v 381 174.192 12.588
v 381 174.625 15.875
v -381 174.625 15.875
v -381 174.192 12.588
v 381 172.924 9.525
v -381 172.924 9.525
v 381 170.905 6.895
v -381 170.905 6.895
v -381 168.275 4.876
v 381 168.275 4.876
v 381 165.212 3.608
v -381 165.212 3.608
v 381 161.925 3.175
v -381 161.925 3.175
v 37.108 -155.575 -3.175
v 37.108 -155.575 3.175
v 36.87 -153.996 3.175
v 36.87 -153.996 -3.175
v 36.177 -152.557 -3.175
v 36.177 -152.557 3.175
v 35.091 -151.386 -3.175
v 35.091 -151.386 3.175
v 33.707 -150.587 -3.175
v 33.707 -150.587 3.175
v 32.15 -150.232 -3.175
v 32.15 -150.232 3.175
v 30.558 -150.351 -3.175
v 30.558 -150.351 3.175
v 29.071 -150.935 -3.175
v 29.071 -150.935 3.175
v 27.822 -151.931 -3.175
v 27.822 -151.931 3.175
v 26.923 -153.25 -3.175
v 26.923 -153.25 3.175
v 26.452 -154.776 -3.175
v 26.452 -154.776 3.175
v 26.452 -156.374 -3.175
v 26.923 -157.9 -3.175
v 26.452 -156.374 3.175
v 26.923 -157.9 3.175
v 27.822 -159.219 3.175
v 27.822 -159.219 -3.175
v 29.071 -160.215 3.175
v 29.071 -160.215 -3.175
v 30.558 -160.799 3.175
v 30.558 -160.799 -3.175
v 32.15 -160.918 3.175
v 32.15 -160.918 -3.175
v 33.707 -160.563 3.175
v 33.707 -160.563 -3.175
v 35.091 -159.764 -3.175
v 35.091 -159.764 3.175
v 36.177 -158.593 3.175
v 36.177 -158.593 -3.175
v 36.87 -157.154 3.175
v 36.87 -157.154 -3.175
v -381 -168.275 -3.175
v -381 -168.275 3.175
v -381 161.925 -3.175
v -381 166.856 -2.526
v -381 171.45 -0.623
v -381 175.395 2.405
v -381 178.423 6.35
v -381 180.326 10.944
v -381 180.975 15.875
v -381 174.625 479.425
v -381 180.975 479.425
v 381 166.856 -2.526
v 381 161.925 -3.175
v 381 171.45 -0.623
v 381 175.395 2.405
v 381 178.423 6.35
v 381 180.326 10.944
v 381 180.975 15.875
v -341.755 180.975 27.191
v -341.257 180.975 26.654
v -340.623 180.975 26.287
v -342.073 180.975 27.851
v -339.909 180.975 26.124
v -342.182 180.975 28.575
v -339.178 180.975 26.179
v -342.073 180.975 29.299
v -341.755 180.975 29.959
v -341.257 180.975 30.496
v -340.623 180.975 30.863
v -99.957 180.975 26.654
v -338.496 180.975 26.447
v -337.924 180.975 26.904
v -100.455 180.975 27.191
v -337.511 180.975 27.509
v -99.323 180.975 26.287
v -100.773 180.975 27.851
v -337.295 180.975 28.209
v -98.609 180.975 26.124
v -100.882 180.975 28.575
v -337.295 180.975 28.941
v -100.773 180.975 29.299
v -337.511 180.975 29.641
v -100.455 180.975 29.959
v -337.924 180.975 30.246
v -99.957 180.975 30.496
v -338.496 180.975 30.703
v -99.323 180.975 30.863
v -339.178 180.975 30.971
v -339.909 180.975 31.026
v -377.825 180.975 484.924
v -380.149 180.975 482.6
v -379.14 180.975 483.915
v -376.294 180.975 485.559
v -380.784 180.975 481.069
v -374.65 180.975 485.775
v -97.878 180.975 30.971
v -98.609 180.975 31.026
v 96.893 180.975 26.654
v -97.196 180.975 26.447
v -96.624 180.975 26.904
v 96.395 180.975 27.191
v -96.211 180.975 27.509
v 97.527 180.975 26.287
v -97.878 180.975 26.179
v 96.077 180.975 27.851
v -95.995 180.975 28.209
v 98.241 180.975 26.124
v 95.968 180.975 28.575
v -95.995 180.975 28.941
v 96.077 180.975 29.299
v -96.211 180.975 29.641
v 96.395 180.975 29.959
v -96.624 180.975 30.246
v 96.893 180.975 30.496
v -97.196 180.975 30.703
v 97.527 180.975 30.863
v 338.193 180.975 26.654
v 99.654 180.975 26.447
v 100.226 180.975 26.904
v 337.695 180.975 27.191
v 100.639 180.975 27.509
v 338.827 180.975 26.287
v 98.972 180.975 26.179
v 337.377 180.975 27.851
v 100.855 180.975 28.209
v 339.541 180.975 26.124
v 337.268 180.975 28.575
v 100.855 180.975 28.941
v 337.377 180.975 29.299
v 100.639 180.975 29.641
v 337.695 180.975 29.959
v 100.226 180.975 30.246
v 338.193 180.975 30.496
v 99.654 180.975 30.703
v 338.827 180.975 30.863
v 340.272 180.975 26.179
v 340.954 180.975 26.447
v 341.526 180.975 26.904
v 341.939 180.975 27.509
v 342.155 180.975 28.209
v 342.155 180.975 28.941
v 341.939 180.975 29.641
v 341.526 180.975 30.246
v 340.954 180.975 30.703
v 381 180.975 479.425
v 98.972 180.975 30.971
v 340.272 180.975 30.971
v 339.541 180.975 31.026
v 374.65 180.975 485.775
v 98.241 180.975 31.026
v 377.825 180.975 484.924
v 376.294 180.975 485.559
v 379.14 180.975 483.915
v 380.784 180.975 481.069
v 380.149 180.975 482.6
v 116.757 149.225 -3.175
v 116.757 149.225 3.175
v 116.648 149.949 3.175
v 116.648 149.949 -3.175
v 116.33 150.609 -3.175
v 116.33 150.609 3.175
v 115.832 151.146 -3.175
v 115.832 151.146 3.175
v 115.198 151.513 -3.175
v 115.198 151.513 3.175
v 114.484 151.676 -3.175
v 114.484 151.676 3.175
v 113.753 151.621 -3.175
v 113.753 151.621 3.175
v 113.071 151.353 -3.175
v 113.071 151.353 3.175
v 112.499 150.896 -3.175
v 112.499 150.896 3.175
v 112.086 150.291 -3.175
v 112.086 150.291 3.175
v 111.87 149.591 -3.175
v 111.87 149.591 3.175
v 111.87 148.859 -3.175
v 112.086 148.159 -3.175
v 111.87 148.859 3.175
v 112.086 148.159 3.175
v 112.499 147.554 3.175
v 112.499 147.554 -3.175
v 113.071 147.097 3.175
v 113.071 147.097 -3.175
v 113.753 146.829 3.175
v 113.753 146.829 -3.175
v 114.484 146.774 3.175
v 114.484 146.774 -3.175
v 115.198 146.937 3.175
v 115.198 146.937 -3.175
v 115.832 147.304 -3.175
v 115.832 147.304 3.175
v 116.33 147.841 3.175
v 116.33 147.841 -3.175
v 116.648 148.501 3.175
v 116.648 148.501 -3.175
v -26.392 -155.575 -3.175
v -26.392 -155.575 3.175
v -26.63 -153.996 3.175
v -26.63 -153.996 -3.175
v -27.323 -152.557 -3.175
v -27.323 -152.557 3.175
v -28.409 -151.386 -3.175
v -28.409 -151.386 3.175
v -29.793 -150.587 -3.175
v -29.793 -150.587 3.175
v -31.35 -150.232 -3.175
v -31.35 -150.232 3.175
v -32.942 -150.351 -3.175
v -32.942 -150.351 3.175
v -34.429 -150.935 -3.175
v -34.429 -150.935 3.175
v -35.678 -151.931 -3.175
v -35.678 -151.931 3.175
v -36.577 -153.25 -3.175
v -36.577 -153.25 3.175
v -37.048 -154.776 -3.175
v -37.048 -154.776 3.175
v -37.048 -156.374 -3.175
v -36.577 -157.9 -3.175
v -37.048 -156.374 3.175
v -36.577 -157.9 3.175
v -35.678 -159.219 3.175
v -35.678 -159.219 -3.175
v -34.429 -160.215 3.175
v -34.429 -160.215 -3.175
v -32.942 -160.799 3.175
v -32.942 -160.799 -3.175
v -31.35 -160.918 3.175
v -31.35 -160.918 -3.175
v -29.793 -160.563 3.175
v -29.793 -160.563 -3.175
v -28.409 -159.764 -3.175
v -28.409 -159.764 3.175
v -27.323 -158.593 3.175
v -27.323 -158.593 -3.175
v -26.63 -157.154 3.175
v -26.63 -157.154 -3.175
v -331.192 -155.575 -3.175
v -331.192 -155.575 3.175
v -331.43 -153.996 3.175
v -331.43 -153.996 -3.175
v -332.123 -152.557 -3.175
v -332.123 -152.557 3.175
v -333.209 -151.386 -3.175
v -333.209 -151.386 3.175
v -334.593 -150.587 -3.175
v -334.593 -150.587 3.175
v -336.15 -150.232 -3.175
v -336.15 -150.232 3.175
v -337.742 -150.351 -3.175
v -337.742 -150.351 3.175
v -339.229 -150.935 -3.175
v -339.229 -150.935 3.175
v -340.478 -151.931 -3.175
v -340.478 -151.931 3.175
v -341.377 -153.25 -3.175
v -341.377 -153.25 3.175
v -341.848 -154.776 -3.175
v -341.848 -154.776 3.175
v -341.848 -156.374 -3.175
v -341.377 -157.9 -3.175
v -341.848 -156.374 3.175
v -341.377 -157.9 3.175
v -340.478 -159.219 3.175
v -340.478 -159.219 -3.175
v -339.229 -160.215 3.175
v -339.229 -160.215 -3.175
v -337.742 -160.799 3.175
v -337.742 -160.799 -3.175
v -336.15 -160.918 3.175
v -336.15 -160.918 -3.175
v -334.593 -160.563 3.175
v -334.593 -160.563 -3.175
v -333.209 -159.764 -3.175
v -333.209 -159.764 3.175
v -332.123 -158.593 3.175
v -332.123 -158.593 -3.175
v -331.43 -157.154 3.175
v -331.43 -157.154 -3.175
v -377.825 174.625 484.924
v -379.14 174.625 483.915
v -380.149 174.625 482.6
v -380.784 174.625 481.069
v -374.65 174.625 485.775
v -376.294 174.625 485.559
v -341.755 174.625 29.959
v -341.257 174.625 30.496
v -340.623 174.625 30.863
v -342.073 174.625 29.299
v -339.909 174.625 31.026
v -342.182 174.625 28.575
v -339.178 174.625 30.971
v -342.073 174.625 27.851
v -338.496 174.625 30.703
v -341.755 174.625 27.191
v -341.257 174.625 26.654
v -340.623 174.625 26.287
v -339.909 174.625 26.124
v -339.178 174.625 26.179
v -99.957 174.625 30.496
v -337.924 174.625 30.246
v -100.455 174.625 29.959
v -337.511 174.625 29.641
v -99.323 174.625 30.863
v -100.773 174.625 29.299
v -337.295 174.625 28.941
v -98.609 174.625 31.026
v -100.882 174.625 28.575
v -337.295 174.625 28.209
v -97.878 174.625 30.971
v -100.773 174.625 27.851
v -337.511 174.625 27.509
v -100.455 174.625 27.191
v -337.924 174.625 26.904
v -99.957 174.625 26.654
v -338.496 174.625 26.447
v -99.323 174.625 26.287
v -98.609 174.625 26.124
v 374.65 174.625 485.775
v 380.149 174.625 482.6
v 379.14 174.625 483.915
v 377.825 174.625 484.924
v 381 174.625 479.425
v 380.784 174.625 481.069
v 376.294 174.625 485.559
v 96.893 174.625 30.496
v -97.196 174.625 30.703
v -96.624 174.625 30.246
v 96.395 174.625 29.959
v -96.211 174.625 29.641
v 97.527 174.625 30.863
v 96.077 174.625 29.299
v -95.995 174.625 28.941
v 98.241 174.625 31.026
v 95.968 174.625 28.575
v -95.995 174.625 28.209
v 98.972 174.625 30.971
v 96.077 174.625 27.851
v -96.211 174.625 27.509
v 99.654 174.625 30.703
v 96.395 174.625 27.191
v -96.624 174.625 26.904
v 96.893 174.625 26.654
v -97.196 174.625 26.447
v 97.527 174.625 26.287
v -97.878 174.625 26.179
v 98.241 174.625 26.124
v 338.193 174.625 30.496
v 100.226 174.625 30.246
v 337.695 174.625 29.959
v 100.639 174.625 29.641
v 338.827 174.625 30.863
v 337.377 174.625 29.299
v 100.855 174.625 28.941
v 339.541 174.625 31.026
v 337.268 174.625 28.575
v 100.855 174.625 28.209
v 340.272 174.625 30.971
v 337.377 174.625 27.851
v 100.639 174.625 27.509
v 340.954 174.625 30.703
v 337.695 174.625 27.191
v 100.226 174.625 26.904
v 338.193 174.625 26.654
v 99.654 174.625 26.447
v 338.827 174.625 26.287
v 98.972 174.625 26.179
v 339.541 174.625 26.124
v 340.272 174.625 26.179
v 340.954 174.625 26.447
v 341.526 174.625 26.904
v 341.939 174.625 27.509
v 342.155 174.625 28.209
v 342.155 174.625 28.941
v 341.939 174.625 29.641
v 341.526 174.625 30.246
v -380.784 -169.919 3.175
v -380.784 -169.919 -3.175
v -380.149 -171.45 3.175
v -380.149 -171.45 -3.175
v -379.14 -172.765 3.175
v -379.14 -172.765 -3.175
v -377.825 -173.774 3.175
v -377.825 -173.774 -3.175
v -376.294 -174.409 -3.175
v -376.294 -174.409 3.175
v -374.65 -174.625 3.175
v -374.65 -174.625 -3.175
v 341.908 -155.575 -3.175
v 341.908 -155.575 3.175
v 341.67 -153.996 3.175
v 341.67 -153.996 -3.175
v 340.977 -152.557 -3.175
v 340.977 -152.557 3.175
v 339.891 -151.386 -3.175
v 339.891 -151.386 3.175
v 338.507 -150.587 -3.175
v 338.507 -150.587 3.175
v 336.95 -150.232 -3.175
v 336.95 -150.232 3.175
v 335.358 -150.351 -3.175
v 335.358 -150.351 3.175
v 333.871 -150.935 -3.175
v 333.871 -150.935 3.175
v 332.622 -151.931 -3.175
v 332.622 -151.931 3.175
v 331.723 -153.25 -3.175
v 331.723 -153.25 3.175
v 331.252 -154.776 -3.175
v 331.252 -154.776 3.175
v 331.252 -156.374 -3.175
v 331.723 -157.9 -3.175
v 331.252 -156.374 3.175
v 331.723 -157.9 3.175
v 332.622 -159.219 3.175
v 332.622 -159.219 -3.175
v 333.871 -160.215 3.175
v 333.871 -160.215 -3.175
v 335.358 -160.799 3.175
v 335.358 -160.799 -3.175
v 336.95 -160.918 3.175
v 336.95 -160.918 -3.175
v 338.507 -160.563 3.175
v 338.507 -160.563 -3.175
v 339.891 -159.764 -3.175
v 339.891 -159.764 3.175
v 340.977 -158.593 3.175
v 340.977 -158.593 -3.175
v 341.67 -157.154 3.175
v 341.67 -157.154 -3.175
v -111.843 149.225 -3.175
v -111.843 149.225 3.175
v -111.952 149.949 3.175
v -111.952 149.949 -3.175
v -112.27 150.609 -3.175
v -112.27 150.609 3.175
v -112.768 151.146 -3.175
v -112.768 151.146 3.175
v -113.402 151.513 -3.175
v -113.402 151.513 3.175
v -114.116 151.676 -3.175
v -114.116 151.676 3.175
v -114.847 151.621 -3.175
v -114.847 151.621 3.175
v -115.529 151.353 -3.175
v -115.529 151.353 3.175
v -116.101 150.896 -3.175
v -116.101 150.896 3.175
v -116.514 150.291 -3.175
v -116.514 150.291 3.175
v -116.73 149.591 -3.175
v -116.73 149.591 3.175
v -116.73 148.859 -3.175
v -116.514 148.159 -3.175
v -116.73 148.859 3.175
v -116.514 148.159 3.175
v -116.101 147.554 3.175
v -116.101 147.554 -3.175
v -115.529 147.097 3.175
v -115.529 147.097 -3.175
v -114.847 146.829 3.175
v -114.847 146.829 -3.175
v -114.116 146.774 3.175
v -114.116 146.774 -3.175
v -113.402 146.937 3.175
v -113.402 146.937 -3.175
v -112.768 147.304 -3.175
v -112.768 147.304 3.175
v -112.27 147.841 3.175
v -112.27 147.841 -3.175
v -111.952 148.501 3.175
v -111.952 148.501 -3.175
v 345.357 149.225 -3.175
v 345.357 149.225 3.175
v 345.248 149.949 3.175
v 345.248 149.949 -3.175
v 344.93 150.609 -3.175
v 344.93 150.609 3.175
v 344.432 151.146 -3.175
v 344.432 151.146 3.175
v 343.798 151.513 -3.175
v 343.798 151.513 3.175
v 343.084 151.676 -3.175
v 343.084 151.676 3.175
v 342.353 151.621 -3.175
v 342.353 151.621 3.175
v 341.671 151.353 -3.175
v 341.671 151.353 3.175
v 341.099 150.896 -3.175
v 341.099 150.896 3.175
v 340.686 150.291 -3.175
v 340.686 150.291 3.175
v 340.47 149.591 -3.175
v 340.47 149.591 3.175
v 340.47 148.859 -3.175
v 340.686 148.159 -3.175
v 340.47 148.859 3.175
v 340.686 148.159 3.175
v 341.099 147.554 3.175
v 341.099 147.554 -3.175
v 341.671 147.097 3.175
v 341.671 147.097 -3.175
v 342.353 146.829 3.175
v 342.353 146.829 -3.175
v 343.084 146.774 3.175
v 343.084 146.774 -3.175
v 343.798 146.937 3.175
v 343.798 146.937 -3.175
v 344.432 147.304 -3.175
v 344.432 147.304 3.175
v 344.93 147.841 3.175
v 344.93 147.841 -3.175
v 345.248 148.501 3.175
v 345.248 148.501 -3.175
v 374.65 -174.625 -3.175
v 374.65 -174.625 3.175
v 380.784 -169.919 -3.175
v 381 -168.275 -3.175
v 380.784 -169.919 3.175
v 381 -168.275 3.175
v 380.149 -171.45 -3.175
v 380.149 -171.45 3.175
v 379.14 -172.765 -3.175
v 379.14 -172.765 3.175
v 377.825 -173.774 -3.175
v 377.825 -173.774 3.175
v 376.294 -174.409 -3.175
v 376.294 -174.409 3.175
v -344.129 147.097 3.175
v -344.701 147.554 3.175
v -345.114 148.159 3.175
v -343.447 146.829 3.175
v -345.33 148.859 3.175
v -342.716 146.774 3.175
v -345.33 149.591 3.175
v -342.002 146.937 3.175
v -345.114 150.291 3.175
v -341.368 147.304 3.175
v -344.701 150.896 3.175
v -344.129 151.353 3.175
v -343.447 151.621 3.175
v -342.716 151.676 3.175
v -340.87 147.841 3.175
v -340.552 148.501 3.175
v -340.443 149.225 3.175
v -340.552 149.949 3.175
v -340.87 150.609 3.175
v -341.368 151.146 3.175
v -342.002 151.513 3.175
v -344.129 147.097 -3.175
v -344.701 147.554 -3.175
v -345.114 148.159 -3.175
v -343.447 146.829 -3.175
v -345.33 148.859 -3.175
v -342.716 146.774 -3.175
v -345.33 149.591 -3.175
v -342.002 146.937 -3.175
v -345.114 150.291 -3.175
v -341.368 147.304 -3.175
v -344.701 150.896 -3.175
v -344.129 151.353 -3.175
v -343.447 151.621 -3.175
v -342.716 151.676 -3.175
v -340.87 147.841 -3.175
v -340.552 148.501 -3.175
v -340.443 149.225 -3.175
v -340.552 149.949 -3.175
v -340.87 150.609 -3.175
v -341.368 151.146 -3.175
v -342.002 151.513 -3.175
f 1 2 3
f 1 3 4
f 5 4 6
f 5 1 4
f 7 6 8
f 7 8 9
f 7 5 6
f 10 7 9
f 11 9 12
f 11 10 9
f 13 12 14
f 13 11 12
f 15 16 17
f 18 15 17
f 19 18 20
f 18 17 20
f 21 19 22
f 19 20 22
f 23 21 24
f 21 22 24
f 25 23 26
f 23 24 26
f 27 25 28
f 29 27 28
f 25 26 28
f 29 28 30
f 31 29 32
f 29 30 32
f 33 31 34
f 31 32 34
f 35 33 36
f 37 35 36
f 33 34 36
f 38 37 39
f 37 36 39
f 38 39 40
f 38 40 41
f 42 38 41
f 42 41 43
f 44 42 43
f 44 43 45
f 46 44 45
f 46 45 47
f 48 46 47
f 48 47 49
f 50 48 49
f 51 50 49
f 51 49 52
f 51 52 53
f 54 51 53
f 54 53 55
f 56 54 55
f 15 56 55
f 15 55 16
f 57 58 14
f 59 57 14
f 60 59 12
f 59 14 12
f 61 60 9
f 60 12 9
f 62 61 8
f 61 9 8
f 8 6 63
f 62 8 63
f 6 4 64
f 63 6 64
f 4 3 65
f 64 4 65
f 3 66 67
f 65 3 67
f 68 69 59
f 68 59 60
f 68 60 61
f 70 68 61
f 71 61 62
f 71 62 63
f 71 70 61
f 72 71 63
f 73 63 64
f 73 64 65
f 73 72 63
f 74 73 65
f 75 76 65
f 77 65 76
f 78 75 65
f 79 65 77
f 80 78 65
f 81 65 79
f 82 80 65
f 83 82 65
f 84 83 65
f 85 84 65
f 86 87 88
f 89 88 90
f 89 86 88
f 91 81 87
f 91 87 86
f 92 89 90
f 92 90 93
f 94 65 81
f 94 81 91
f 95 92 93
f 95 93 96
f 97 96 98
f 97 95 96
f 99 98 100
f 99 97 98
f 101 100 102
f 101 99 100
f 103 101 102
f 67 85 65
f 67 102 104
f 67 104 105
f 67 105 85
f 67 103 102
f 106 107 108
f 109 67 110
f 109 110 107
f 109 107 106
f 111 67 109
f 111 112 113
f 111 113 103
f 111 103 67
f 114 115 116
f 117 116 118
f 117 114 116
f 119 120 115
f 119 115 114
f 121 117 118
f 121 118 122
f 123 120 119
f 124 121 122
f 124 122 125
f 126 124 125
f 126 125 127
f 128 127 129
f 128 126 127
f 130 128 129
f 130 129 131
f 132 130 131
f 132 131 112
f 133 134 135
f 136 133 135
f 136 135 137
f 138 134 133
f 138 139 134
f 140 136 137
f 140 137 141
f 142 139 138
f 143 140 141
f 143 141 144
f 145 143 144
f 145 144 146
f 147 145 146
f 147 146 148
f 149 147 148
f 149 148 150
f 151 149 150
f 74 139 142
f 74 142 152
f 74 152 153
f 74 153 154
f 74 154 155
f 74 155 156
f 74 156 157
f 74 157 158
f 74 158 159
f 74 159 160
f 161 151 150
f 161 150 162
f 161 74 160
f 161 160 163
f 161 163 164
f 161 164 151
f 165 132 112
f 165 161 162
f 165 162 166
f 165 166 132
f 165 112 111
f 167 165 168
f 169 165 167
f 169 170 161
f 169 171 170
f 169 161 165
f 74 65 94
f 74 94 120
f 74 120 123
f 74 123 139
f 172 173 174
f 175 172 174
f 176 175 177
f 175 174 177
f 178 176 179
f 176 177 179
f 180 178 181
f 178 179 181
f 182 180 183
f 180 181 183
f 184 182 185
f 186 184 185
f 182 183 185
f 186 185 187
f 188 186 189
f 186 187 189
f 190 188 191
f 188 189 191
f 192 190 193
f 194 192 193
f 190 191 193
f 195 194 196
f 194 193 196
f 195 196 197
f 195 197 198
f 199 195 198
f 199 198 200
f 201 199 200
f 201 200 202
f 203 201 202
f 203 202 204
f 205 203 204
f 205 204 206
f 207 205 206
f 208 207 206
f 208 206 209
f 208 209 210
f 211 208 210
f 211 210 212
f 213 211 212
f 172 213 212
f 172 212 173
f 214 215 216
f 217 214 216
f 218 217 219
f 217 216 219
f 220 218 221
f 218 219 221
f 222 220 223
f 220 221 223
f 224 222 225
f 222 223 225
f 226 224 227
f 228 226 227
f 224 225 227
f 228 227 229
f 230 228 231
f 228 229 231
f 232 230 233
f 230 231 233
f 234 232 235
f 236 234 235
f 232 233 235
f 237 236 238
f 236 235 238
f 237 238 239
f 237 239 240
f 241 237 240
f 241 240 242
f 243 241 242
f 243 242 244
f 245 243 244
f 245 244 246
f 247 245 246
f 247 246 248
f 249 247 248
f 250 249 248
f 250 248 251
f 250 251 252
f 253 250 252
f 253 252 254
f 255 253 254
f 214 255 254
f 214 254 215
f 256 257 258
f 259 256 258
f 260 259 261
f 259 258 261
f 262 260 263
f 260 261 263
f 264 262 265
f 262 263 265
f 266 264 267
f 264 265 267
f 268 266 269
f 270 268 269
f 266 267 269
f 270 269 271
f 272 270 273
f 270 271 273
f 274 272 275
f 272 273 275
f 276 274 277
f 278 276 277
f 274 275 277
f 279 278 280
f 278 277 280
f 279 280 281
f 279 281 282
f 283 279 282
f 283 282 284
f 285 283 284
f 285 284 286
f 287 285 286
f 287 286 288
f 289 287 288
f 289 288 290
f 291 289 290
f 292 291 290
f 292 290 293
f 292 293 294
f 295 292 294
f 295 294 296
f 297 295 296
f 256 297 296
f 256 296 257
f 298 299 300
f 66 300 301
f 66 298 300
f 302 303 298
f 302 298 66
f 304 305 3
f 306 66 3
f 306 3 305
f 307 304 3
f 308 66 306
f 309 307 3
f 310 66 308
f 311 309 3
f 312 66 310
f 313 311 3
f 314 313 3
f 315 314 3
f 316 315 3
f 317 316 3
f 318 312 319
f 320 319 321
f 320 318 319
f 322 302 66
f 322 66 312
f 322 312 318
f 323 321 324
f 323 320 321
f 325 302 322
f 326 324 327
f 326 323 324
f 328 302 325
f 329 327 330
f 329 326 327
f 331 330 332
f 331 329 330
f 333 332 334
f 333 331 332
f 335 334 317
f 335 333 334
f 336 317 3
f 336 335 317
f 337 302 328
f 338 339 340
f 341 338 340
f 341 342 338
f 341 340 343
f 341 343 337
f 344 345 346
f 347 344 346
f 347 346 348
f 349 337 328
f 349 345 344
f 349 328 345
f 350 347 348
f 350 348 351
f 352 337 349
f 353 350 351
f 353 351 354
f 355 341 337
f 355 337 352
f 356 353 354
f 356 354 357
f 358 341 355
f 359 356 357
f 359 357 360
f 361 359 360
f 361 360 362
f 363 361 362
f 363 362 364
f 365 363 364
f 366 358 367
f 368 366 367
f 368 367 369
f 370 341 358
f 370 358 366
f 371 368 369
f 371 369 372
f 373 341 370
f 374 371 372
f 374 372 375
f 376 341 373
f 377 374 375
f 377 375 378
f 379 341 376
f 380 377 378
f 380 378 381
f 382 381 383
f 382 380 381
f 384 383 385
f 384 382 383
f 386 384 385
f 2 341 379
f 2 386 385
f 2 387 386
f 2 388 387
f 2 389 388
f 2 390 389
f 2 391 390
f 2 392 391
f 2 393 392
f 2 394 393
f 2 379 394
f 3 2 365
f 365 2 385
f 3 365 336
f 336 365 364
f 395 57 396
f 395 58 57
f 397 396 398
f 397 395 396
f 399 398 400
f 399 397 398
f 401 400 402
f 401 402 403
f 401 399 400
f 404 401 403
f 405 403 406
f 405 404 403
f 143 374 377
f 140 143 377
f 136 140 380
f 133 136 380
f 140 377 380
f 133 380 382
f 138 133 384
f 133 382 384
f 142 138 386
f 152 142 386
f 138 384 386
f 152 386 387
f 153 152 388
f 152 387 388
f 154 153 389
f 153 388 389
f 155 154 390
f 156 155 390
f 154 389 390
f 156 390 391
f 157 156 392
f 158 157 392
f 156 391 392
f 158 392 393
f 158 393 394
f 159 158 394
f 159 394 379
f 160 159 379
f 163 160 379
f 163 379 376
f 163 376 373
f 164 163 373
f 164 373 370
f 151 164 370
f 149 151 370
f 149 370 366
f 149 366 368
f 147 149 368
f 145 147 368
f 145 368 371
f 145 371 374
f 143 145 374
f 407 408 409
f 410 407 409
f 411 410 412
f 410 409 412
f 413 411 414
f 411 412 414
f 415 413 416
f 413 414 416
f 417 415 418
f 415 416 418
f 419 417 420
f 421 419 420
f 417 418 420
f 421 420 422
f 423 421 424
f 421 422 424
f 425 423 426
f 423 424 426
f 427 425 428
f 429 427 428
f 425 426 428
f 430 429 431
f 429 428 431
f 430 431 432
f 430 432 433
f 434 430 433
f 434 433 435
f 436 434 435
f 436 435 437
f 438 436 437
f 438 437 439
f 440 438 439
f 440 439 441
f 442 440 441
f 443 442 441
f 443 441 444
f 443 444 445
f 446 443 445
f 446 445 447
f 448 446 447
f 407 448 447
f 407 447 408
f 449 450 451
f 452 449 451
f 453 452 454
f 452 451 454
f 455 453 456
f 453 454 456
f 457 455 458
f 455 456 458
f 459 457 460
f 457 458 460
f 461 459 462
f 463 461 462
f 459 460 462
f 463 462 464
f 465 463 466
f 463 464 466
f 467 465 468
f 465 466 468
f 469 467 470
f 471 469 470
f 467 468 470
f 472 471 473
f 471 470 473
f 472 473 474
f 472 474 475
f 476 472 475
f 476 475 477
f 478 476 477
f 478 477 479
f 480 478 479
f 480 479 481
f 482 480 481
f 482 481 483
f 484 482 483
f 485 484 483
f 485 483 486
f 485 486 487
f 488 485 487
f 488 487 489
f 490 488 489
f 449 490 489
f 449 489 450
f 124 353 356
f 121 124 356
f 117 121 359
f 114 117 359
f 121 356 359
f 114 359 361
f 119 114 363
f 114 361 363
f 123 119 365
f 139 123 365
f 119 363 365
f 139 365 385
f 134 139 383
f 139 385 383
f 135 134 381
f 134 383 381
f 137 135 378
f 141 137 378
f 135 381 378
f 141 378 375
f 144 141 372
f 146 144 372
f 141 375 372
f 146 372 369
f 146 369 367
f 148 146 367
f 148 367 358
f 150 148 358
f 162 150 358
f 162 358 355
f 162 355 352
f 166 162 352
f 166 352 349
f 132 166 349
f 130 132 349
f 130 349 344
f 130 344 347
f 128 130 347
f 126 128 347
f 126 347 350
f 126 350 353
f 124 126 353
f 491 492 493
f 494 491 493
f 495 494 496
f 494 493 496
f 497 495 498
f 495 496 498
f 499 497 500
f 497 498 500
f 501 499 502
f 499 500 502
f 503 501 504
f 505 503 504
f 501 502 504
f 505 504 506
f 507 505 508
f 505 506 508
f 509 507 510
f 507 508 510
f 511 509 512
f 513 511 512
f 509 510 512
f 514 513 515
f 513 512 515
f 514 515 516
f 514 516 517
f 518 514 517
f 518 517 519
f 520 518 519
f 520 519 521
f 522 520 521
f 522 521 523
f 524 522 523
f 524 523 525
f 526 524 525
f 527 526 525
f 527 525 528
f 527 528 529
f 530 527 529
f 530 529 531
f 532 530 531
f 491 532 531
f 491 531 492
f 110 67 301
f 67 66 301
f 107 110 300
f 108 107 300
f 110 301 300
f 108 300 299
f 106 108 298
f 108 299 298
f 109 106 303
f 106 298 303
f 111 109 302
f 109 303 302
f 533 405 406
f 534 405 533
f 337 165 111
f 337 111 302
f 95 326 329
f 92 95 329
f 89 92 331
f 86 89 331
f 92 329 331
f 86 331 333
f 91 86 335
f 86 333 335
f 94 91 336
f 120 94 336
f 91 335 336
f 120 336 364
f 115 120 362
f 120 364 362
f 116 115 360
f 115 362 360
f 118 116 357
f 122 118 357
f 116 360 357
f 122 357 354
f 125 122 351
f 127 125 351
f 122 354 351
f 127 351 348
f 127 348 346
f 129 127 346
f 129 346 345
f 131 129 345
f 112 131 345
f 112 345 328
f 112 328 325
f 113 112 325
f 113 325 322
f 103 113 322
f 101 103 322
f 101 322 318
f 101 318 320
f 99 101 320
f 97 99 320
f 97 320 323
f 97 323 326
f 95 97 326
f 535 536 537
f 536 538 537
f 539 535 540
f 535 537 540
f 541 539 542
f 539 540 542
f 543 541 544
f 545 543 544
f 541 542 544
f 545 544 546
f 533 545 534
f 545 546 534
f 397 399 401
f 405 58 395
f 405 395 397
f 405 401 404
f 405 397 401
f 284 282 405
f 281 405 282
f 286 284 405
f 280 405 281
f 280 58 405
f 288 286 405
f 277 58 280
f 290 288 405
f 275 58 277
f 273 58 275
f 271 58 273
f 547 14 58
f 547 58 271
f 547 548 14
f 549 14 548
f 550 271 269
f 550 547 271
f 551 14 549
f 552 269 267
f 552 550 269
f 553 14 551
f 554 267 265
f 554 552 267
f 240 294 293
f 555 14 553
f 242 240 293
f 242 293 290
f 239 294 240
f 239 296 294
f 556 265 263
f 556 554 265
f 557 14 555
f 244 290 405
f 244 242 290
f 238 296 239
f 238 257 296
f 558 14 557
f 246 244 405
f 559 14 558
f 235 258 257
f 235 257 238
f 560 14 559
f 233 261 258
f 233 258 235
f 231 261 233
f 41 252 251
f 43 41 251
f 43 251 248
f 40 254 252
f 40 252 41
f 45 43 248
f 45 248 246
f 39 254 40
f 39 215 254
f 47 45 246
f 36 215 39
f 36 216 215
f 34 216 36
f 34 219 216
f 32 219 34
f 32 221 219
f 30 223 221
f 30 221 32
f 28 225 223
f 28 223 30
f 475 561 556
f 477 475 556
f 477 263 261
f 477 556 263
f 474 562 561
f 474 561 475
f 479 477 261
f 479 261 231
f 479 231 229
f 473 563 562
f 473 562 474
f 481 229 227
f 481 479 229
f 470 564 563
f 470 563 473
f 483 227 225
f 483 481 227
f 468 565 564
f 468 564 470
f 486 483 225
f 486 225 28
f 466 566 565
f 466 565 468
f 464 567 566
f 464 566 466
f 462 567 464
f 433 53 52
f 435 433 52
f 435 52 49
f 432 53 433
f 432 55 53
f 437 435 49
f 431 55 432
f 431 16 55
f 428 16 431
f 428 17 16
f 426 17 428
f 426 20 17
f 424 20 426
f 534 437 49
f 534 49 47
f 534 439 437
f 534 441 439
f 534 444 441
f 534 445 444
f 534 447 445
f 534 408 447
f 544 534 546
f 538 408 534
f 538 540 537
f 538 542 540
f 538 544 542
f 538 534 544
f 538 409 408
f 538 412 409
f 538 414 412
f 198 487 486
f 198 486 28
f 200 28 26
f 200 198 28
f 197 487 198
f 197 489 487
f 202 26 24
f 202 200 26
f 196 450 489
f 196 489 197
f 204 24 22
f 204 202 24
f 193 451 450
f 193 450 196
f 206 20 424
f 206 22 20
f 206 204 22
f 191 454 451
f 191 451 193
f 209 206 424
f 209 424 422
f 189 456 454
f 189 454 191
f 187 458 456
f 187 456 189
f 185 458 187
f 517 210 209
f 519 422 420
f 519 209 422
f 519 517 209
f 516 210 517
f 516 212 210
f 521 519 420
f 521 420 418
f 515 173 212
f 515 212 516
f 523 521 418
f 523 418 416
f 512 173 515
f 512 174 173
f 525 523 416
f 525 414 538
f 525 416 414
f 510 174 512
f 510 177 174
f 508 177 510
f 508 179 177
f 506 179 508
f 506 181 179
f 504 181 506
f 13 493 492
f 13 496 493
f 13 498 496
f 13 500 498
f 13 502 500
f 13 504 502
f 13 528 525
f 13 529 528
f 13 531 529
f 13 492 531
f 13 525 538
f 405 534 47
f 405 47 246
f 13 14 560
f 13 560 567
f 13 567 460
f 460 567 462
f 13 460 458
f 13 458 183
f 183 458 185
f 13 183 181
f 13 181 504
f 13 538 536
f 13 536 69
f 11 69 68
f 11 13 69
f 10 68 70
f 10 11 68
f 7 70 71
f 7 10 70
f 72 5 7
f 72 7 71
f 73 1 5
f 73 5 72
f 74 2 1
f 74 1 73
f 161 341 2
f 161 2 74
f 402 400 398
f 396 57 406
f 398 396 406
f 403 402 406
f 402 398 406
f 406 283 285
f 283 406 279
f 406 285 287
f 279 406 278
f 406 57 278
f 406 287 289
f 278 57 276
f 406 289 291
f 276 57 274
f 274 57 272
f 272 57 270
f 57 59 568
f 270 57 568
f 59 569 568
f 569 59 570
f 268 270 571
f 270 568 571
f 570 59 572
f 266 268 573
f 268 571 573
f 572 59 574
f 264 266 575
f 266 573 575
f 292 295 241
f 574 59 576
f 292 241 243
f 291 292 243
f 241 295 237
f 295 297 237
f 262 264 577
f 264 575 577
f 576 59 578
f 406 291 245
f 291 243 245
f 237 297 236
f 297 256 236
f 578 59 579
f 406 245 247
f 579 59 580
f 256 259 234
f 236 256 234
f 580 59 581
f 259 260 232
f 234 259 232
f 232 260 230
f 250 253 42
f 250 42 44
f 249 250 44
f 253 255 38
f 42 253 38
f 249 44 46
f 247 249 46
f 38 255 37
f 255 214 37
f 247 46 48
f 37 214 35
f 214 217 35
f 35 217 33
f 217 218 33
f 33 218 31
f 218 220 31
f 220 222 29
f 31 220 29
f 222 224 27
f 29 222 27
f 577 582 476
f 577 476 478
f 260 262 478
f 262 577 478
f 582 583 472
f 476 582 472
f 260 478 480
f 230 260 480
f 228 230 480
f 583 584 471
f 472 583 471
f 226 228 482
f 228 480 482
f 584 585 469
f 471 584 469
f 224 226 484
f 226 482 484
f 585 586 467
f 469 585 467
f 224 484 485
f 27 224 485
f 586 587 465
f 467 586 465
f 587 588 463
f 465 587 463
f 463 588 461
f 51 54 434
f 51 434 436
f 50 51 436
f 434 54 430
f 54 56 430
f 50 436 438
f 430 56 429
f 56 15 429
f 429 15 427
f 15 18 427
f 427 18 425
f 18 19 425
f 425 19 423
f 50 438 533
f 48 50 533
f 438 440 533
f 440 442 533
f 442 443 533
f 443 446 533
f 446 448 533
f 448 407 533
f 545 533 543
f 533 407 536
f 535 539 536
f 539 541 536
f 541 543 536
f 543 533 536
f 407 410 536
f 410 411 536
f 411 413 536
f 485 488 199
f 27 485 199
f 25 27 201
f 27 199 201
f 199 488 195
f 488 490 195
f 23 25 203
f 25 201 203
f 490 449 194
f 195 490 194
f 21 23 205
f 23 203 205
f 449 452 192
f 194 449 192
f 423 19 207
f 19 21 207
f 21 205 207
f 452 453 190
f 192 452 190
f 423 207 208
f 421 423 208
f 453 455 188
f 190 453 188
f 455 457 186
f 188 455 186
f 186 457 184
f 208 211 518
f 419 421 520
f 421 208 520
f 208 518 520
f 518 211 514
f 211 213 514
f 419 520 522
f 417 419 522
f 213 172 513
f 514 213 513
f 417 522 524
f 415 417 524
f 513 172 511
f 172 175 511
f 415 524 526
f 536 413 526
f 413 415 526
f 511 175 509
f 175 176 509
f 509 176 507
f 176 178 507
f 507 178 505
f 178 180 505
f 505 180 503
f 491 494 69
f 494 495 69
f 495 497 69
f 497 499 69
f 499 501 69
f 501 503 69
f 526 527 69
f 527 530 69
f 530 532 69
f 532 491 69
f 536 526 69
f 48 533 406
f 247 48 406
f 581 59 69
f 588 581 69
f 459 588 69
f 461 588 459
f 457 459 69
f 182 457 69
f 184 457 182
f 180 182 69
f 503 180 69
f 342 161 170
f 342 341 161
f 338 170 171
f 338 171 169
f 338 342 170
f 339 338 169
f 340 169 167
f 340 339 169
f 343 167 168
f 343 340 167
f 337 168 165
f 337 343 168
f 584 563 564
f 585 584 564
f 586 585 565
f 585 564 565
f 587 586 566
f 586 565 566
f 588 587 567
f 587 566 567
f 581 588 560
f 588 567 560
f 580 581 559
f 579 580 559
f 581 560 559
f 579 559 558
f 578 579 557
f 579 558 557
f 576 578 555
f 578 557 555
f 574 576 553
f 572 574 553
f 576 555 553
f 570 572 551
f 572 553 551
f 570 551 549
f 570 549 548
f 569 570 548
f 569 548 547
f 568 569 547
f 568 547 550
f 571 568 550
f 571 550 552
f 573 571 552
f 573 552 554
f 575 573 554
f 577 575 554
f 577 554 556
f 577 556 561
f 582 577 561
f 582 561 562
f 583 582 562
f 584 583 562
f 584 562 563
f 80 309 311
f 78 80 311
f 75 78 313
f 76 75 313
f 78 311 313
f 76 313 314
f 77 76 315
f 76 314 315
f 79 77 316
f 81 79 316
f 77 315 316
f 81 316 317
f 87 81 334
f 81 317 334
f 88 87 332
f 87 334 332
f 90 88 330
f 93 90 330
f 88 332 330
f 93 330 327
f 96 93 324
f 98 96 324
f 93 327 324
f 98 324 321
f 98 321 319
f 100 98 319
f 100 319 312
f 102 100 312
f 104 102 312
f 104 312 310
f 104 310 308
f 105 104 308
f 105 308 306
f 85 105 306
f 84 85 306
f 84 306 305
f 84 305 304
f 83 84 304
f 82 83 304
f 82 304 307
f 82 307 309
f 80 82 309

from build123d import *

# Parameters (mm, degrees)
SKETCH1_W                        = 762
SKETCH1_H                        = 349.25
BOSS_EXTRUDE1_DEPTH              = 3.175
EDGE_FLANGE1_STRIP_W             = 50.8
EDGE_FLANGE1_STRIP_H             = 6.35
EDGE_FLANGE1_STRIP_CUT_DEPTH     = 762
EDGE_FLANGE1_DEPTH               = 762
F_27_64_0_42188_DIAMETER_HOLE1_D = 10.715752
F_10_0_1935_DIAMETER_HOLE1_D     = 4.9149
F_10_0_1935_DIAMETER_HOLE2_D     = 4.9149
FILLET1_R                        = 6.35


# Sheet-metal steps are written as plain solids
with BuildPart() as part:
    # Sketch1 → Boss-Extrude1 (new, symmetric)
    with BuildSketch(Plane.XY):
        Rectangle(SKETCH1_W, SKETCH1_H)
    extrude(amount=BOSS_EXTRUDE1_DEPTH, both=True)

    # Edge-Flange1 strip (across the edge) → Edge-Flange1 strip cut (cut)
    with BuildSketch(Plane(origin=(381, 174.625, 3.175), x_dir=(0, -1, 0), z_dir=(-1, 0, 0))):
        with Locations((-12.7, -3.175)):
            Rectangle(EDGE_FLANGE1_STRIP_W, EDGE_FLANGE1_STRIP_H)
    extrude(amount=EDGE_FLANGE1_STRIP_CUT_DEPTH, mode=Mode.SUBTRACT)

    # Edge-Flange1 section (across the edge) → Edge-Flange1 (add)
    with BuildSketch(Plane(origin=(381, 174.625, 3.175), x_dir=(0, -1, 0), z_dir=(-1, 0, 0))):
        with BuildLine():
            Line((-6.35, 12.7), (-6.35, 482.6))
            Line((-6.35, 482.6), (0, 482.6))
            Line((0, 482.6), (0, 12.7))
            ThreePointArc((0, 12.7), (3.719743879, 3.719743879), (12.7, 0))
            Line((12.7, 0), (12.7, -6.35))
            ThreePointArc((12.7, -6.35), (-0.770384182, -0.770384182), (-6.35, 12.7))
        make_face()
    extrude(amount=EDGE_FLANGE1_DEPTH)

    # 27/64 (0.42188) Diameter Hole1 (through all)
    with Locations(Plane(origin=(0, 0, -3.175), x_dir=(-1, 0, 0), z_dir=(0, 0, -1))):
        with Locations((-31.75, -155.575), (336.55, -155.575), (31.75, -155.575), (-336.55, -155.575)):
            Hole(F_27_64_0_42188_DIAMETER_HOLE1_D / 2)

    # #10 (0.1935) Diameter Hole1 (through all)
    with Locations(Plane(origin=(0, 0, -3.175), x_dir=(-1, 0, 0), z_dir=(0, 0, -1))):
        with Locations((-342.9, 149.225), (-114.3, 149.225), (114.3, 149.225), (342.9, 149.225)):
            Hole(F_10_0_1935_DIAMETER_HOLE1_D / 2)

    # #10 (0.1935) Diameter Hole2 (through all)
    with Locations(Plane(origin=(0, 180.975, 0), x_dir=(1, 0, 0), z_dir=(0, 1, 0))):
        with Locations((-339.725, -28.575), (-98.425, -28.575), (98.425, -28.575), (339.725, -28.575)):
            Hole(F_10_0_1935_DIAMETER_HOLE2_D / 2)

    # Fillet1
    fillet1_edges = [part.edges().sort_by_distance(p)[0] for p in [
        (381, 177.8, 485.775),
        (-381, 177.8, 485.775),
        (381, -174.625, 0),
        (-381, -174.625, 0),
    ]]
    fillet(fillet1_edges, radius=FILLET1_R)


solid = part.part
